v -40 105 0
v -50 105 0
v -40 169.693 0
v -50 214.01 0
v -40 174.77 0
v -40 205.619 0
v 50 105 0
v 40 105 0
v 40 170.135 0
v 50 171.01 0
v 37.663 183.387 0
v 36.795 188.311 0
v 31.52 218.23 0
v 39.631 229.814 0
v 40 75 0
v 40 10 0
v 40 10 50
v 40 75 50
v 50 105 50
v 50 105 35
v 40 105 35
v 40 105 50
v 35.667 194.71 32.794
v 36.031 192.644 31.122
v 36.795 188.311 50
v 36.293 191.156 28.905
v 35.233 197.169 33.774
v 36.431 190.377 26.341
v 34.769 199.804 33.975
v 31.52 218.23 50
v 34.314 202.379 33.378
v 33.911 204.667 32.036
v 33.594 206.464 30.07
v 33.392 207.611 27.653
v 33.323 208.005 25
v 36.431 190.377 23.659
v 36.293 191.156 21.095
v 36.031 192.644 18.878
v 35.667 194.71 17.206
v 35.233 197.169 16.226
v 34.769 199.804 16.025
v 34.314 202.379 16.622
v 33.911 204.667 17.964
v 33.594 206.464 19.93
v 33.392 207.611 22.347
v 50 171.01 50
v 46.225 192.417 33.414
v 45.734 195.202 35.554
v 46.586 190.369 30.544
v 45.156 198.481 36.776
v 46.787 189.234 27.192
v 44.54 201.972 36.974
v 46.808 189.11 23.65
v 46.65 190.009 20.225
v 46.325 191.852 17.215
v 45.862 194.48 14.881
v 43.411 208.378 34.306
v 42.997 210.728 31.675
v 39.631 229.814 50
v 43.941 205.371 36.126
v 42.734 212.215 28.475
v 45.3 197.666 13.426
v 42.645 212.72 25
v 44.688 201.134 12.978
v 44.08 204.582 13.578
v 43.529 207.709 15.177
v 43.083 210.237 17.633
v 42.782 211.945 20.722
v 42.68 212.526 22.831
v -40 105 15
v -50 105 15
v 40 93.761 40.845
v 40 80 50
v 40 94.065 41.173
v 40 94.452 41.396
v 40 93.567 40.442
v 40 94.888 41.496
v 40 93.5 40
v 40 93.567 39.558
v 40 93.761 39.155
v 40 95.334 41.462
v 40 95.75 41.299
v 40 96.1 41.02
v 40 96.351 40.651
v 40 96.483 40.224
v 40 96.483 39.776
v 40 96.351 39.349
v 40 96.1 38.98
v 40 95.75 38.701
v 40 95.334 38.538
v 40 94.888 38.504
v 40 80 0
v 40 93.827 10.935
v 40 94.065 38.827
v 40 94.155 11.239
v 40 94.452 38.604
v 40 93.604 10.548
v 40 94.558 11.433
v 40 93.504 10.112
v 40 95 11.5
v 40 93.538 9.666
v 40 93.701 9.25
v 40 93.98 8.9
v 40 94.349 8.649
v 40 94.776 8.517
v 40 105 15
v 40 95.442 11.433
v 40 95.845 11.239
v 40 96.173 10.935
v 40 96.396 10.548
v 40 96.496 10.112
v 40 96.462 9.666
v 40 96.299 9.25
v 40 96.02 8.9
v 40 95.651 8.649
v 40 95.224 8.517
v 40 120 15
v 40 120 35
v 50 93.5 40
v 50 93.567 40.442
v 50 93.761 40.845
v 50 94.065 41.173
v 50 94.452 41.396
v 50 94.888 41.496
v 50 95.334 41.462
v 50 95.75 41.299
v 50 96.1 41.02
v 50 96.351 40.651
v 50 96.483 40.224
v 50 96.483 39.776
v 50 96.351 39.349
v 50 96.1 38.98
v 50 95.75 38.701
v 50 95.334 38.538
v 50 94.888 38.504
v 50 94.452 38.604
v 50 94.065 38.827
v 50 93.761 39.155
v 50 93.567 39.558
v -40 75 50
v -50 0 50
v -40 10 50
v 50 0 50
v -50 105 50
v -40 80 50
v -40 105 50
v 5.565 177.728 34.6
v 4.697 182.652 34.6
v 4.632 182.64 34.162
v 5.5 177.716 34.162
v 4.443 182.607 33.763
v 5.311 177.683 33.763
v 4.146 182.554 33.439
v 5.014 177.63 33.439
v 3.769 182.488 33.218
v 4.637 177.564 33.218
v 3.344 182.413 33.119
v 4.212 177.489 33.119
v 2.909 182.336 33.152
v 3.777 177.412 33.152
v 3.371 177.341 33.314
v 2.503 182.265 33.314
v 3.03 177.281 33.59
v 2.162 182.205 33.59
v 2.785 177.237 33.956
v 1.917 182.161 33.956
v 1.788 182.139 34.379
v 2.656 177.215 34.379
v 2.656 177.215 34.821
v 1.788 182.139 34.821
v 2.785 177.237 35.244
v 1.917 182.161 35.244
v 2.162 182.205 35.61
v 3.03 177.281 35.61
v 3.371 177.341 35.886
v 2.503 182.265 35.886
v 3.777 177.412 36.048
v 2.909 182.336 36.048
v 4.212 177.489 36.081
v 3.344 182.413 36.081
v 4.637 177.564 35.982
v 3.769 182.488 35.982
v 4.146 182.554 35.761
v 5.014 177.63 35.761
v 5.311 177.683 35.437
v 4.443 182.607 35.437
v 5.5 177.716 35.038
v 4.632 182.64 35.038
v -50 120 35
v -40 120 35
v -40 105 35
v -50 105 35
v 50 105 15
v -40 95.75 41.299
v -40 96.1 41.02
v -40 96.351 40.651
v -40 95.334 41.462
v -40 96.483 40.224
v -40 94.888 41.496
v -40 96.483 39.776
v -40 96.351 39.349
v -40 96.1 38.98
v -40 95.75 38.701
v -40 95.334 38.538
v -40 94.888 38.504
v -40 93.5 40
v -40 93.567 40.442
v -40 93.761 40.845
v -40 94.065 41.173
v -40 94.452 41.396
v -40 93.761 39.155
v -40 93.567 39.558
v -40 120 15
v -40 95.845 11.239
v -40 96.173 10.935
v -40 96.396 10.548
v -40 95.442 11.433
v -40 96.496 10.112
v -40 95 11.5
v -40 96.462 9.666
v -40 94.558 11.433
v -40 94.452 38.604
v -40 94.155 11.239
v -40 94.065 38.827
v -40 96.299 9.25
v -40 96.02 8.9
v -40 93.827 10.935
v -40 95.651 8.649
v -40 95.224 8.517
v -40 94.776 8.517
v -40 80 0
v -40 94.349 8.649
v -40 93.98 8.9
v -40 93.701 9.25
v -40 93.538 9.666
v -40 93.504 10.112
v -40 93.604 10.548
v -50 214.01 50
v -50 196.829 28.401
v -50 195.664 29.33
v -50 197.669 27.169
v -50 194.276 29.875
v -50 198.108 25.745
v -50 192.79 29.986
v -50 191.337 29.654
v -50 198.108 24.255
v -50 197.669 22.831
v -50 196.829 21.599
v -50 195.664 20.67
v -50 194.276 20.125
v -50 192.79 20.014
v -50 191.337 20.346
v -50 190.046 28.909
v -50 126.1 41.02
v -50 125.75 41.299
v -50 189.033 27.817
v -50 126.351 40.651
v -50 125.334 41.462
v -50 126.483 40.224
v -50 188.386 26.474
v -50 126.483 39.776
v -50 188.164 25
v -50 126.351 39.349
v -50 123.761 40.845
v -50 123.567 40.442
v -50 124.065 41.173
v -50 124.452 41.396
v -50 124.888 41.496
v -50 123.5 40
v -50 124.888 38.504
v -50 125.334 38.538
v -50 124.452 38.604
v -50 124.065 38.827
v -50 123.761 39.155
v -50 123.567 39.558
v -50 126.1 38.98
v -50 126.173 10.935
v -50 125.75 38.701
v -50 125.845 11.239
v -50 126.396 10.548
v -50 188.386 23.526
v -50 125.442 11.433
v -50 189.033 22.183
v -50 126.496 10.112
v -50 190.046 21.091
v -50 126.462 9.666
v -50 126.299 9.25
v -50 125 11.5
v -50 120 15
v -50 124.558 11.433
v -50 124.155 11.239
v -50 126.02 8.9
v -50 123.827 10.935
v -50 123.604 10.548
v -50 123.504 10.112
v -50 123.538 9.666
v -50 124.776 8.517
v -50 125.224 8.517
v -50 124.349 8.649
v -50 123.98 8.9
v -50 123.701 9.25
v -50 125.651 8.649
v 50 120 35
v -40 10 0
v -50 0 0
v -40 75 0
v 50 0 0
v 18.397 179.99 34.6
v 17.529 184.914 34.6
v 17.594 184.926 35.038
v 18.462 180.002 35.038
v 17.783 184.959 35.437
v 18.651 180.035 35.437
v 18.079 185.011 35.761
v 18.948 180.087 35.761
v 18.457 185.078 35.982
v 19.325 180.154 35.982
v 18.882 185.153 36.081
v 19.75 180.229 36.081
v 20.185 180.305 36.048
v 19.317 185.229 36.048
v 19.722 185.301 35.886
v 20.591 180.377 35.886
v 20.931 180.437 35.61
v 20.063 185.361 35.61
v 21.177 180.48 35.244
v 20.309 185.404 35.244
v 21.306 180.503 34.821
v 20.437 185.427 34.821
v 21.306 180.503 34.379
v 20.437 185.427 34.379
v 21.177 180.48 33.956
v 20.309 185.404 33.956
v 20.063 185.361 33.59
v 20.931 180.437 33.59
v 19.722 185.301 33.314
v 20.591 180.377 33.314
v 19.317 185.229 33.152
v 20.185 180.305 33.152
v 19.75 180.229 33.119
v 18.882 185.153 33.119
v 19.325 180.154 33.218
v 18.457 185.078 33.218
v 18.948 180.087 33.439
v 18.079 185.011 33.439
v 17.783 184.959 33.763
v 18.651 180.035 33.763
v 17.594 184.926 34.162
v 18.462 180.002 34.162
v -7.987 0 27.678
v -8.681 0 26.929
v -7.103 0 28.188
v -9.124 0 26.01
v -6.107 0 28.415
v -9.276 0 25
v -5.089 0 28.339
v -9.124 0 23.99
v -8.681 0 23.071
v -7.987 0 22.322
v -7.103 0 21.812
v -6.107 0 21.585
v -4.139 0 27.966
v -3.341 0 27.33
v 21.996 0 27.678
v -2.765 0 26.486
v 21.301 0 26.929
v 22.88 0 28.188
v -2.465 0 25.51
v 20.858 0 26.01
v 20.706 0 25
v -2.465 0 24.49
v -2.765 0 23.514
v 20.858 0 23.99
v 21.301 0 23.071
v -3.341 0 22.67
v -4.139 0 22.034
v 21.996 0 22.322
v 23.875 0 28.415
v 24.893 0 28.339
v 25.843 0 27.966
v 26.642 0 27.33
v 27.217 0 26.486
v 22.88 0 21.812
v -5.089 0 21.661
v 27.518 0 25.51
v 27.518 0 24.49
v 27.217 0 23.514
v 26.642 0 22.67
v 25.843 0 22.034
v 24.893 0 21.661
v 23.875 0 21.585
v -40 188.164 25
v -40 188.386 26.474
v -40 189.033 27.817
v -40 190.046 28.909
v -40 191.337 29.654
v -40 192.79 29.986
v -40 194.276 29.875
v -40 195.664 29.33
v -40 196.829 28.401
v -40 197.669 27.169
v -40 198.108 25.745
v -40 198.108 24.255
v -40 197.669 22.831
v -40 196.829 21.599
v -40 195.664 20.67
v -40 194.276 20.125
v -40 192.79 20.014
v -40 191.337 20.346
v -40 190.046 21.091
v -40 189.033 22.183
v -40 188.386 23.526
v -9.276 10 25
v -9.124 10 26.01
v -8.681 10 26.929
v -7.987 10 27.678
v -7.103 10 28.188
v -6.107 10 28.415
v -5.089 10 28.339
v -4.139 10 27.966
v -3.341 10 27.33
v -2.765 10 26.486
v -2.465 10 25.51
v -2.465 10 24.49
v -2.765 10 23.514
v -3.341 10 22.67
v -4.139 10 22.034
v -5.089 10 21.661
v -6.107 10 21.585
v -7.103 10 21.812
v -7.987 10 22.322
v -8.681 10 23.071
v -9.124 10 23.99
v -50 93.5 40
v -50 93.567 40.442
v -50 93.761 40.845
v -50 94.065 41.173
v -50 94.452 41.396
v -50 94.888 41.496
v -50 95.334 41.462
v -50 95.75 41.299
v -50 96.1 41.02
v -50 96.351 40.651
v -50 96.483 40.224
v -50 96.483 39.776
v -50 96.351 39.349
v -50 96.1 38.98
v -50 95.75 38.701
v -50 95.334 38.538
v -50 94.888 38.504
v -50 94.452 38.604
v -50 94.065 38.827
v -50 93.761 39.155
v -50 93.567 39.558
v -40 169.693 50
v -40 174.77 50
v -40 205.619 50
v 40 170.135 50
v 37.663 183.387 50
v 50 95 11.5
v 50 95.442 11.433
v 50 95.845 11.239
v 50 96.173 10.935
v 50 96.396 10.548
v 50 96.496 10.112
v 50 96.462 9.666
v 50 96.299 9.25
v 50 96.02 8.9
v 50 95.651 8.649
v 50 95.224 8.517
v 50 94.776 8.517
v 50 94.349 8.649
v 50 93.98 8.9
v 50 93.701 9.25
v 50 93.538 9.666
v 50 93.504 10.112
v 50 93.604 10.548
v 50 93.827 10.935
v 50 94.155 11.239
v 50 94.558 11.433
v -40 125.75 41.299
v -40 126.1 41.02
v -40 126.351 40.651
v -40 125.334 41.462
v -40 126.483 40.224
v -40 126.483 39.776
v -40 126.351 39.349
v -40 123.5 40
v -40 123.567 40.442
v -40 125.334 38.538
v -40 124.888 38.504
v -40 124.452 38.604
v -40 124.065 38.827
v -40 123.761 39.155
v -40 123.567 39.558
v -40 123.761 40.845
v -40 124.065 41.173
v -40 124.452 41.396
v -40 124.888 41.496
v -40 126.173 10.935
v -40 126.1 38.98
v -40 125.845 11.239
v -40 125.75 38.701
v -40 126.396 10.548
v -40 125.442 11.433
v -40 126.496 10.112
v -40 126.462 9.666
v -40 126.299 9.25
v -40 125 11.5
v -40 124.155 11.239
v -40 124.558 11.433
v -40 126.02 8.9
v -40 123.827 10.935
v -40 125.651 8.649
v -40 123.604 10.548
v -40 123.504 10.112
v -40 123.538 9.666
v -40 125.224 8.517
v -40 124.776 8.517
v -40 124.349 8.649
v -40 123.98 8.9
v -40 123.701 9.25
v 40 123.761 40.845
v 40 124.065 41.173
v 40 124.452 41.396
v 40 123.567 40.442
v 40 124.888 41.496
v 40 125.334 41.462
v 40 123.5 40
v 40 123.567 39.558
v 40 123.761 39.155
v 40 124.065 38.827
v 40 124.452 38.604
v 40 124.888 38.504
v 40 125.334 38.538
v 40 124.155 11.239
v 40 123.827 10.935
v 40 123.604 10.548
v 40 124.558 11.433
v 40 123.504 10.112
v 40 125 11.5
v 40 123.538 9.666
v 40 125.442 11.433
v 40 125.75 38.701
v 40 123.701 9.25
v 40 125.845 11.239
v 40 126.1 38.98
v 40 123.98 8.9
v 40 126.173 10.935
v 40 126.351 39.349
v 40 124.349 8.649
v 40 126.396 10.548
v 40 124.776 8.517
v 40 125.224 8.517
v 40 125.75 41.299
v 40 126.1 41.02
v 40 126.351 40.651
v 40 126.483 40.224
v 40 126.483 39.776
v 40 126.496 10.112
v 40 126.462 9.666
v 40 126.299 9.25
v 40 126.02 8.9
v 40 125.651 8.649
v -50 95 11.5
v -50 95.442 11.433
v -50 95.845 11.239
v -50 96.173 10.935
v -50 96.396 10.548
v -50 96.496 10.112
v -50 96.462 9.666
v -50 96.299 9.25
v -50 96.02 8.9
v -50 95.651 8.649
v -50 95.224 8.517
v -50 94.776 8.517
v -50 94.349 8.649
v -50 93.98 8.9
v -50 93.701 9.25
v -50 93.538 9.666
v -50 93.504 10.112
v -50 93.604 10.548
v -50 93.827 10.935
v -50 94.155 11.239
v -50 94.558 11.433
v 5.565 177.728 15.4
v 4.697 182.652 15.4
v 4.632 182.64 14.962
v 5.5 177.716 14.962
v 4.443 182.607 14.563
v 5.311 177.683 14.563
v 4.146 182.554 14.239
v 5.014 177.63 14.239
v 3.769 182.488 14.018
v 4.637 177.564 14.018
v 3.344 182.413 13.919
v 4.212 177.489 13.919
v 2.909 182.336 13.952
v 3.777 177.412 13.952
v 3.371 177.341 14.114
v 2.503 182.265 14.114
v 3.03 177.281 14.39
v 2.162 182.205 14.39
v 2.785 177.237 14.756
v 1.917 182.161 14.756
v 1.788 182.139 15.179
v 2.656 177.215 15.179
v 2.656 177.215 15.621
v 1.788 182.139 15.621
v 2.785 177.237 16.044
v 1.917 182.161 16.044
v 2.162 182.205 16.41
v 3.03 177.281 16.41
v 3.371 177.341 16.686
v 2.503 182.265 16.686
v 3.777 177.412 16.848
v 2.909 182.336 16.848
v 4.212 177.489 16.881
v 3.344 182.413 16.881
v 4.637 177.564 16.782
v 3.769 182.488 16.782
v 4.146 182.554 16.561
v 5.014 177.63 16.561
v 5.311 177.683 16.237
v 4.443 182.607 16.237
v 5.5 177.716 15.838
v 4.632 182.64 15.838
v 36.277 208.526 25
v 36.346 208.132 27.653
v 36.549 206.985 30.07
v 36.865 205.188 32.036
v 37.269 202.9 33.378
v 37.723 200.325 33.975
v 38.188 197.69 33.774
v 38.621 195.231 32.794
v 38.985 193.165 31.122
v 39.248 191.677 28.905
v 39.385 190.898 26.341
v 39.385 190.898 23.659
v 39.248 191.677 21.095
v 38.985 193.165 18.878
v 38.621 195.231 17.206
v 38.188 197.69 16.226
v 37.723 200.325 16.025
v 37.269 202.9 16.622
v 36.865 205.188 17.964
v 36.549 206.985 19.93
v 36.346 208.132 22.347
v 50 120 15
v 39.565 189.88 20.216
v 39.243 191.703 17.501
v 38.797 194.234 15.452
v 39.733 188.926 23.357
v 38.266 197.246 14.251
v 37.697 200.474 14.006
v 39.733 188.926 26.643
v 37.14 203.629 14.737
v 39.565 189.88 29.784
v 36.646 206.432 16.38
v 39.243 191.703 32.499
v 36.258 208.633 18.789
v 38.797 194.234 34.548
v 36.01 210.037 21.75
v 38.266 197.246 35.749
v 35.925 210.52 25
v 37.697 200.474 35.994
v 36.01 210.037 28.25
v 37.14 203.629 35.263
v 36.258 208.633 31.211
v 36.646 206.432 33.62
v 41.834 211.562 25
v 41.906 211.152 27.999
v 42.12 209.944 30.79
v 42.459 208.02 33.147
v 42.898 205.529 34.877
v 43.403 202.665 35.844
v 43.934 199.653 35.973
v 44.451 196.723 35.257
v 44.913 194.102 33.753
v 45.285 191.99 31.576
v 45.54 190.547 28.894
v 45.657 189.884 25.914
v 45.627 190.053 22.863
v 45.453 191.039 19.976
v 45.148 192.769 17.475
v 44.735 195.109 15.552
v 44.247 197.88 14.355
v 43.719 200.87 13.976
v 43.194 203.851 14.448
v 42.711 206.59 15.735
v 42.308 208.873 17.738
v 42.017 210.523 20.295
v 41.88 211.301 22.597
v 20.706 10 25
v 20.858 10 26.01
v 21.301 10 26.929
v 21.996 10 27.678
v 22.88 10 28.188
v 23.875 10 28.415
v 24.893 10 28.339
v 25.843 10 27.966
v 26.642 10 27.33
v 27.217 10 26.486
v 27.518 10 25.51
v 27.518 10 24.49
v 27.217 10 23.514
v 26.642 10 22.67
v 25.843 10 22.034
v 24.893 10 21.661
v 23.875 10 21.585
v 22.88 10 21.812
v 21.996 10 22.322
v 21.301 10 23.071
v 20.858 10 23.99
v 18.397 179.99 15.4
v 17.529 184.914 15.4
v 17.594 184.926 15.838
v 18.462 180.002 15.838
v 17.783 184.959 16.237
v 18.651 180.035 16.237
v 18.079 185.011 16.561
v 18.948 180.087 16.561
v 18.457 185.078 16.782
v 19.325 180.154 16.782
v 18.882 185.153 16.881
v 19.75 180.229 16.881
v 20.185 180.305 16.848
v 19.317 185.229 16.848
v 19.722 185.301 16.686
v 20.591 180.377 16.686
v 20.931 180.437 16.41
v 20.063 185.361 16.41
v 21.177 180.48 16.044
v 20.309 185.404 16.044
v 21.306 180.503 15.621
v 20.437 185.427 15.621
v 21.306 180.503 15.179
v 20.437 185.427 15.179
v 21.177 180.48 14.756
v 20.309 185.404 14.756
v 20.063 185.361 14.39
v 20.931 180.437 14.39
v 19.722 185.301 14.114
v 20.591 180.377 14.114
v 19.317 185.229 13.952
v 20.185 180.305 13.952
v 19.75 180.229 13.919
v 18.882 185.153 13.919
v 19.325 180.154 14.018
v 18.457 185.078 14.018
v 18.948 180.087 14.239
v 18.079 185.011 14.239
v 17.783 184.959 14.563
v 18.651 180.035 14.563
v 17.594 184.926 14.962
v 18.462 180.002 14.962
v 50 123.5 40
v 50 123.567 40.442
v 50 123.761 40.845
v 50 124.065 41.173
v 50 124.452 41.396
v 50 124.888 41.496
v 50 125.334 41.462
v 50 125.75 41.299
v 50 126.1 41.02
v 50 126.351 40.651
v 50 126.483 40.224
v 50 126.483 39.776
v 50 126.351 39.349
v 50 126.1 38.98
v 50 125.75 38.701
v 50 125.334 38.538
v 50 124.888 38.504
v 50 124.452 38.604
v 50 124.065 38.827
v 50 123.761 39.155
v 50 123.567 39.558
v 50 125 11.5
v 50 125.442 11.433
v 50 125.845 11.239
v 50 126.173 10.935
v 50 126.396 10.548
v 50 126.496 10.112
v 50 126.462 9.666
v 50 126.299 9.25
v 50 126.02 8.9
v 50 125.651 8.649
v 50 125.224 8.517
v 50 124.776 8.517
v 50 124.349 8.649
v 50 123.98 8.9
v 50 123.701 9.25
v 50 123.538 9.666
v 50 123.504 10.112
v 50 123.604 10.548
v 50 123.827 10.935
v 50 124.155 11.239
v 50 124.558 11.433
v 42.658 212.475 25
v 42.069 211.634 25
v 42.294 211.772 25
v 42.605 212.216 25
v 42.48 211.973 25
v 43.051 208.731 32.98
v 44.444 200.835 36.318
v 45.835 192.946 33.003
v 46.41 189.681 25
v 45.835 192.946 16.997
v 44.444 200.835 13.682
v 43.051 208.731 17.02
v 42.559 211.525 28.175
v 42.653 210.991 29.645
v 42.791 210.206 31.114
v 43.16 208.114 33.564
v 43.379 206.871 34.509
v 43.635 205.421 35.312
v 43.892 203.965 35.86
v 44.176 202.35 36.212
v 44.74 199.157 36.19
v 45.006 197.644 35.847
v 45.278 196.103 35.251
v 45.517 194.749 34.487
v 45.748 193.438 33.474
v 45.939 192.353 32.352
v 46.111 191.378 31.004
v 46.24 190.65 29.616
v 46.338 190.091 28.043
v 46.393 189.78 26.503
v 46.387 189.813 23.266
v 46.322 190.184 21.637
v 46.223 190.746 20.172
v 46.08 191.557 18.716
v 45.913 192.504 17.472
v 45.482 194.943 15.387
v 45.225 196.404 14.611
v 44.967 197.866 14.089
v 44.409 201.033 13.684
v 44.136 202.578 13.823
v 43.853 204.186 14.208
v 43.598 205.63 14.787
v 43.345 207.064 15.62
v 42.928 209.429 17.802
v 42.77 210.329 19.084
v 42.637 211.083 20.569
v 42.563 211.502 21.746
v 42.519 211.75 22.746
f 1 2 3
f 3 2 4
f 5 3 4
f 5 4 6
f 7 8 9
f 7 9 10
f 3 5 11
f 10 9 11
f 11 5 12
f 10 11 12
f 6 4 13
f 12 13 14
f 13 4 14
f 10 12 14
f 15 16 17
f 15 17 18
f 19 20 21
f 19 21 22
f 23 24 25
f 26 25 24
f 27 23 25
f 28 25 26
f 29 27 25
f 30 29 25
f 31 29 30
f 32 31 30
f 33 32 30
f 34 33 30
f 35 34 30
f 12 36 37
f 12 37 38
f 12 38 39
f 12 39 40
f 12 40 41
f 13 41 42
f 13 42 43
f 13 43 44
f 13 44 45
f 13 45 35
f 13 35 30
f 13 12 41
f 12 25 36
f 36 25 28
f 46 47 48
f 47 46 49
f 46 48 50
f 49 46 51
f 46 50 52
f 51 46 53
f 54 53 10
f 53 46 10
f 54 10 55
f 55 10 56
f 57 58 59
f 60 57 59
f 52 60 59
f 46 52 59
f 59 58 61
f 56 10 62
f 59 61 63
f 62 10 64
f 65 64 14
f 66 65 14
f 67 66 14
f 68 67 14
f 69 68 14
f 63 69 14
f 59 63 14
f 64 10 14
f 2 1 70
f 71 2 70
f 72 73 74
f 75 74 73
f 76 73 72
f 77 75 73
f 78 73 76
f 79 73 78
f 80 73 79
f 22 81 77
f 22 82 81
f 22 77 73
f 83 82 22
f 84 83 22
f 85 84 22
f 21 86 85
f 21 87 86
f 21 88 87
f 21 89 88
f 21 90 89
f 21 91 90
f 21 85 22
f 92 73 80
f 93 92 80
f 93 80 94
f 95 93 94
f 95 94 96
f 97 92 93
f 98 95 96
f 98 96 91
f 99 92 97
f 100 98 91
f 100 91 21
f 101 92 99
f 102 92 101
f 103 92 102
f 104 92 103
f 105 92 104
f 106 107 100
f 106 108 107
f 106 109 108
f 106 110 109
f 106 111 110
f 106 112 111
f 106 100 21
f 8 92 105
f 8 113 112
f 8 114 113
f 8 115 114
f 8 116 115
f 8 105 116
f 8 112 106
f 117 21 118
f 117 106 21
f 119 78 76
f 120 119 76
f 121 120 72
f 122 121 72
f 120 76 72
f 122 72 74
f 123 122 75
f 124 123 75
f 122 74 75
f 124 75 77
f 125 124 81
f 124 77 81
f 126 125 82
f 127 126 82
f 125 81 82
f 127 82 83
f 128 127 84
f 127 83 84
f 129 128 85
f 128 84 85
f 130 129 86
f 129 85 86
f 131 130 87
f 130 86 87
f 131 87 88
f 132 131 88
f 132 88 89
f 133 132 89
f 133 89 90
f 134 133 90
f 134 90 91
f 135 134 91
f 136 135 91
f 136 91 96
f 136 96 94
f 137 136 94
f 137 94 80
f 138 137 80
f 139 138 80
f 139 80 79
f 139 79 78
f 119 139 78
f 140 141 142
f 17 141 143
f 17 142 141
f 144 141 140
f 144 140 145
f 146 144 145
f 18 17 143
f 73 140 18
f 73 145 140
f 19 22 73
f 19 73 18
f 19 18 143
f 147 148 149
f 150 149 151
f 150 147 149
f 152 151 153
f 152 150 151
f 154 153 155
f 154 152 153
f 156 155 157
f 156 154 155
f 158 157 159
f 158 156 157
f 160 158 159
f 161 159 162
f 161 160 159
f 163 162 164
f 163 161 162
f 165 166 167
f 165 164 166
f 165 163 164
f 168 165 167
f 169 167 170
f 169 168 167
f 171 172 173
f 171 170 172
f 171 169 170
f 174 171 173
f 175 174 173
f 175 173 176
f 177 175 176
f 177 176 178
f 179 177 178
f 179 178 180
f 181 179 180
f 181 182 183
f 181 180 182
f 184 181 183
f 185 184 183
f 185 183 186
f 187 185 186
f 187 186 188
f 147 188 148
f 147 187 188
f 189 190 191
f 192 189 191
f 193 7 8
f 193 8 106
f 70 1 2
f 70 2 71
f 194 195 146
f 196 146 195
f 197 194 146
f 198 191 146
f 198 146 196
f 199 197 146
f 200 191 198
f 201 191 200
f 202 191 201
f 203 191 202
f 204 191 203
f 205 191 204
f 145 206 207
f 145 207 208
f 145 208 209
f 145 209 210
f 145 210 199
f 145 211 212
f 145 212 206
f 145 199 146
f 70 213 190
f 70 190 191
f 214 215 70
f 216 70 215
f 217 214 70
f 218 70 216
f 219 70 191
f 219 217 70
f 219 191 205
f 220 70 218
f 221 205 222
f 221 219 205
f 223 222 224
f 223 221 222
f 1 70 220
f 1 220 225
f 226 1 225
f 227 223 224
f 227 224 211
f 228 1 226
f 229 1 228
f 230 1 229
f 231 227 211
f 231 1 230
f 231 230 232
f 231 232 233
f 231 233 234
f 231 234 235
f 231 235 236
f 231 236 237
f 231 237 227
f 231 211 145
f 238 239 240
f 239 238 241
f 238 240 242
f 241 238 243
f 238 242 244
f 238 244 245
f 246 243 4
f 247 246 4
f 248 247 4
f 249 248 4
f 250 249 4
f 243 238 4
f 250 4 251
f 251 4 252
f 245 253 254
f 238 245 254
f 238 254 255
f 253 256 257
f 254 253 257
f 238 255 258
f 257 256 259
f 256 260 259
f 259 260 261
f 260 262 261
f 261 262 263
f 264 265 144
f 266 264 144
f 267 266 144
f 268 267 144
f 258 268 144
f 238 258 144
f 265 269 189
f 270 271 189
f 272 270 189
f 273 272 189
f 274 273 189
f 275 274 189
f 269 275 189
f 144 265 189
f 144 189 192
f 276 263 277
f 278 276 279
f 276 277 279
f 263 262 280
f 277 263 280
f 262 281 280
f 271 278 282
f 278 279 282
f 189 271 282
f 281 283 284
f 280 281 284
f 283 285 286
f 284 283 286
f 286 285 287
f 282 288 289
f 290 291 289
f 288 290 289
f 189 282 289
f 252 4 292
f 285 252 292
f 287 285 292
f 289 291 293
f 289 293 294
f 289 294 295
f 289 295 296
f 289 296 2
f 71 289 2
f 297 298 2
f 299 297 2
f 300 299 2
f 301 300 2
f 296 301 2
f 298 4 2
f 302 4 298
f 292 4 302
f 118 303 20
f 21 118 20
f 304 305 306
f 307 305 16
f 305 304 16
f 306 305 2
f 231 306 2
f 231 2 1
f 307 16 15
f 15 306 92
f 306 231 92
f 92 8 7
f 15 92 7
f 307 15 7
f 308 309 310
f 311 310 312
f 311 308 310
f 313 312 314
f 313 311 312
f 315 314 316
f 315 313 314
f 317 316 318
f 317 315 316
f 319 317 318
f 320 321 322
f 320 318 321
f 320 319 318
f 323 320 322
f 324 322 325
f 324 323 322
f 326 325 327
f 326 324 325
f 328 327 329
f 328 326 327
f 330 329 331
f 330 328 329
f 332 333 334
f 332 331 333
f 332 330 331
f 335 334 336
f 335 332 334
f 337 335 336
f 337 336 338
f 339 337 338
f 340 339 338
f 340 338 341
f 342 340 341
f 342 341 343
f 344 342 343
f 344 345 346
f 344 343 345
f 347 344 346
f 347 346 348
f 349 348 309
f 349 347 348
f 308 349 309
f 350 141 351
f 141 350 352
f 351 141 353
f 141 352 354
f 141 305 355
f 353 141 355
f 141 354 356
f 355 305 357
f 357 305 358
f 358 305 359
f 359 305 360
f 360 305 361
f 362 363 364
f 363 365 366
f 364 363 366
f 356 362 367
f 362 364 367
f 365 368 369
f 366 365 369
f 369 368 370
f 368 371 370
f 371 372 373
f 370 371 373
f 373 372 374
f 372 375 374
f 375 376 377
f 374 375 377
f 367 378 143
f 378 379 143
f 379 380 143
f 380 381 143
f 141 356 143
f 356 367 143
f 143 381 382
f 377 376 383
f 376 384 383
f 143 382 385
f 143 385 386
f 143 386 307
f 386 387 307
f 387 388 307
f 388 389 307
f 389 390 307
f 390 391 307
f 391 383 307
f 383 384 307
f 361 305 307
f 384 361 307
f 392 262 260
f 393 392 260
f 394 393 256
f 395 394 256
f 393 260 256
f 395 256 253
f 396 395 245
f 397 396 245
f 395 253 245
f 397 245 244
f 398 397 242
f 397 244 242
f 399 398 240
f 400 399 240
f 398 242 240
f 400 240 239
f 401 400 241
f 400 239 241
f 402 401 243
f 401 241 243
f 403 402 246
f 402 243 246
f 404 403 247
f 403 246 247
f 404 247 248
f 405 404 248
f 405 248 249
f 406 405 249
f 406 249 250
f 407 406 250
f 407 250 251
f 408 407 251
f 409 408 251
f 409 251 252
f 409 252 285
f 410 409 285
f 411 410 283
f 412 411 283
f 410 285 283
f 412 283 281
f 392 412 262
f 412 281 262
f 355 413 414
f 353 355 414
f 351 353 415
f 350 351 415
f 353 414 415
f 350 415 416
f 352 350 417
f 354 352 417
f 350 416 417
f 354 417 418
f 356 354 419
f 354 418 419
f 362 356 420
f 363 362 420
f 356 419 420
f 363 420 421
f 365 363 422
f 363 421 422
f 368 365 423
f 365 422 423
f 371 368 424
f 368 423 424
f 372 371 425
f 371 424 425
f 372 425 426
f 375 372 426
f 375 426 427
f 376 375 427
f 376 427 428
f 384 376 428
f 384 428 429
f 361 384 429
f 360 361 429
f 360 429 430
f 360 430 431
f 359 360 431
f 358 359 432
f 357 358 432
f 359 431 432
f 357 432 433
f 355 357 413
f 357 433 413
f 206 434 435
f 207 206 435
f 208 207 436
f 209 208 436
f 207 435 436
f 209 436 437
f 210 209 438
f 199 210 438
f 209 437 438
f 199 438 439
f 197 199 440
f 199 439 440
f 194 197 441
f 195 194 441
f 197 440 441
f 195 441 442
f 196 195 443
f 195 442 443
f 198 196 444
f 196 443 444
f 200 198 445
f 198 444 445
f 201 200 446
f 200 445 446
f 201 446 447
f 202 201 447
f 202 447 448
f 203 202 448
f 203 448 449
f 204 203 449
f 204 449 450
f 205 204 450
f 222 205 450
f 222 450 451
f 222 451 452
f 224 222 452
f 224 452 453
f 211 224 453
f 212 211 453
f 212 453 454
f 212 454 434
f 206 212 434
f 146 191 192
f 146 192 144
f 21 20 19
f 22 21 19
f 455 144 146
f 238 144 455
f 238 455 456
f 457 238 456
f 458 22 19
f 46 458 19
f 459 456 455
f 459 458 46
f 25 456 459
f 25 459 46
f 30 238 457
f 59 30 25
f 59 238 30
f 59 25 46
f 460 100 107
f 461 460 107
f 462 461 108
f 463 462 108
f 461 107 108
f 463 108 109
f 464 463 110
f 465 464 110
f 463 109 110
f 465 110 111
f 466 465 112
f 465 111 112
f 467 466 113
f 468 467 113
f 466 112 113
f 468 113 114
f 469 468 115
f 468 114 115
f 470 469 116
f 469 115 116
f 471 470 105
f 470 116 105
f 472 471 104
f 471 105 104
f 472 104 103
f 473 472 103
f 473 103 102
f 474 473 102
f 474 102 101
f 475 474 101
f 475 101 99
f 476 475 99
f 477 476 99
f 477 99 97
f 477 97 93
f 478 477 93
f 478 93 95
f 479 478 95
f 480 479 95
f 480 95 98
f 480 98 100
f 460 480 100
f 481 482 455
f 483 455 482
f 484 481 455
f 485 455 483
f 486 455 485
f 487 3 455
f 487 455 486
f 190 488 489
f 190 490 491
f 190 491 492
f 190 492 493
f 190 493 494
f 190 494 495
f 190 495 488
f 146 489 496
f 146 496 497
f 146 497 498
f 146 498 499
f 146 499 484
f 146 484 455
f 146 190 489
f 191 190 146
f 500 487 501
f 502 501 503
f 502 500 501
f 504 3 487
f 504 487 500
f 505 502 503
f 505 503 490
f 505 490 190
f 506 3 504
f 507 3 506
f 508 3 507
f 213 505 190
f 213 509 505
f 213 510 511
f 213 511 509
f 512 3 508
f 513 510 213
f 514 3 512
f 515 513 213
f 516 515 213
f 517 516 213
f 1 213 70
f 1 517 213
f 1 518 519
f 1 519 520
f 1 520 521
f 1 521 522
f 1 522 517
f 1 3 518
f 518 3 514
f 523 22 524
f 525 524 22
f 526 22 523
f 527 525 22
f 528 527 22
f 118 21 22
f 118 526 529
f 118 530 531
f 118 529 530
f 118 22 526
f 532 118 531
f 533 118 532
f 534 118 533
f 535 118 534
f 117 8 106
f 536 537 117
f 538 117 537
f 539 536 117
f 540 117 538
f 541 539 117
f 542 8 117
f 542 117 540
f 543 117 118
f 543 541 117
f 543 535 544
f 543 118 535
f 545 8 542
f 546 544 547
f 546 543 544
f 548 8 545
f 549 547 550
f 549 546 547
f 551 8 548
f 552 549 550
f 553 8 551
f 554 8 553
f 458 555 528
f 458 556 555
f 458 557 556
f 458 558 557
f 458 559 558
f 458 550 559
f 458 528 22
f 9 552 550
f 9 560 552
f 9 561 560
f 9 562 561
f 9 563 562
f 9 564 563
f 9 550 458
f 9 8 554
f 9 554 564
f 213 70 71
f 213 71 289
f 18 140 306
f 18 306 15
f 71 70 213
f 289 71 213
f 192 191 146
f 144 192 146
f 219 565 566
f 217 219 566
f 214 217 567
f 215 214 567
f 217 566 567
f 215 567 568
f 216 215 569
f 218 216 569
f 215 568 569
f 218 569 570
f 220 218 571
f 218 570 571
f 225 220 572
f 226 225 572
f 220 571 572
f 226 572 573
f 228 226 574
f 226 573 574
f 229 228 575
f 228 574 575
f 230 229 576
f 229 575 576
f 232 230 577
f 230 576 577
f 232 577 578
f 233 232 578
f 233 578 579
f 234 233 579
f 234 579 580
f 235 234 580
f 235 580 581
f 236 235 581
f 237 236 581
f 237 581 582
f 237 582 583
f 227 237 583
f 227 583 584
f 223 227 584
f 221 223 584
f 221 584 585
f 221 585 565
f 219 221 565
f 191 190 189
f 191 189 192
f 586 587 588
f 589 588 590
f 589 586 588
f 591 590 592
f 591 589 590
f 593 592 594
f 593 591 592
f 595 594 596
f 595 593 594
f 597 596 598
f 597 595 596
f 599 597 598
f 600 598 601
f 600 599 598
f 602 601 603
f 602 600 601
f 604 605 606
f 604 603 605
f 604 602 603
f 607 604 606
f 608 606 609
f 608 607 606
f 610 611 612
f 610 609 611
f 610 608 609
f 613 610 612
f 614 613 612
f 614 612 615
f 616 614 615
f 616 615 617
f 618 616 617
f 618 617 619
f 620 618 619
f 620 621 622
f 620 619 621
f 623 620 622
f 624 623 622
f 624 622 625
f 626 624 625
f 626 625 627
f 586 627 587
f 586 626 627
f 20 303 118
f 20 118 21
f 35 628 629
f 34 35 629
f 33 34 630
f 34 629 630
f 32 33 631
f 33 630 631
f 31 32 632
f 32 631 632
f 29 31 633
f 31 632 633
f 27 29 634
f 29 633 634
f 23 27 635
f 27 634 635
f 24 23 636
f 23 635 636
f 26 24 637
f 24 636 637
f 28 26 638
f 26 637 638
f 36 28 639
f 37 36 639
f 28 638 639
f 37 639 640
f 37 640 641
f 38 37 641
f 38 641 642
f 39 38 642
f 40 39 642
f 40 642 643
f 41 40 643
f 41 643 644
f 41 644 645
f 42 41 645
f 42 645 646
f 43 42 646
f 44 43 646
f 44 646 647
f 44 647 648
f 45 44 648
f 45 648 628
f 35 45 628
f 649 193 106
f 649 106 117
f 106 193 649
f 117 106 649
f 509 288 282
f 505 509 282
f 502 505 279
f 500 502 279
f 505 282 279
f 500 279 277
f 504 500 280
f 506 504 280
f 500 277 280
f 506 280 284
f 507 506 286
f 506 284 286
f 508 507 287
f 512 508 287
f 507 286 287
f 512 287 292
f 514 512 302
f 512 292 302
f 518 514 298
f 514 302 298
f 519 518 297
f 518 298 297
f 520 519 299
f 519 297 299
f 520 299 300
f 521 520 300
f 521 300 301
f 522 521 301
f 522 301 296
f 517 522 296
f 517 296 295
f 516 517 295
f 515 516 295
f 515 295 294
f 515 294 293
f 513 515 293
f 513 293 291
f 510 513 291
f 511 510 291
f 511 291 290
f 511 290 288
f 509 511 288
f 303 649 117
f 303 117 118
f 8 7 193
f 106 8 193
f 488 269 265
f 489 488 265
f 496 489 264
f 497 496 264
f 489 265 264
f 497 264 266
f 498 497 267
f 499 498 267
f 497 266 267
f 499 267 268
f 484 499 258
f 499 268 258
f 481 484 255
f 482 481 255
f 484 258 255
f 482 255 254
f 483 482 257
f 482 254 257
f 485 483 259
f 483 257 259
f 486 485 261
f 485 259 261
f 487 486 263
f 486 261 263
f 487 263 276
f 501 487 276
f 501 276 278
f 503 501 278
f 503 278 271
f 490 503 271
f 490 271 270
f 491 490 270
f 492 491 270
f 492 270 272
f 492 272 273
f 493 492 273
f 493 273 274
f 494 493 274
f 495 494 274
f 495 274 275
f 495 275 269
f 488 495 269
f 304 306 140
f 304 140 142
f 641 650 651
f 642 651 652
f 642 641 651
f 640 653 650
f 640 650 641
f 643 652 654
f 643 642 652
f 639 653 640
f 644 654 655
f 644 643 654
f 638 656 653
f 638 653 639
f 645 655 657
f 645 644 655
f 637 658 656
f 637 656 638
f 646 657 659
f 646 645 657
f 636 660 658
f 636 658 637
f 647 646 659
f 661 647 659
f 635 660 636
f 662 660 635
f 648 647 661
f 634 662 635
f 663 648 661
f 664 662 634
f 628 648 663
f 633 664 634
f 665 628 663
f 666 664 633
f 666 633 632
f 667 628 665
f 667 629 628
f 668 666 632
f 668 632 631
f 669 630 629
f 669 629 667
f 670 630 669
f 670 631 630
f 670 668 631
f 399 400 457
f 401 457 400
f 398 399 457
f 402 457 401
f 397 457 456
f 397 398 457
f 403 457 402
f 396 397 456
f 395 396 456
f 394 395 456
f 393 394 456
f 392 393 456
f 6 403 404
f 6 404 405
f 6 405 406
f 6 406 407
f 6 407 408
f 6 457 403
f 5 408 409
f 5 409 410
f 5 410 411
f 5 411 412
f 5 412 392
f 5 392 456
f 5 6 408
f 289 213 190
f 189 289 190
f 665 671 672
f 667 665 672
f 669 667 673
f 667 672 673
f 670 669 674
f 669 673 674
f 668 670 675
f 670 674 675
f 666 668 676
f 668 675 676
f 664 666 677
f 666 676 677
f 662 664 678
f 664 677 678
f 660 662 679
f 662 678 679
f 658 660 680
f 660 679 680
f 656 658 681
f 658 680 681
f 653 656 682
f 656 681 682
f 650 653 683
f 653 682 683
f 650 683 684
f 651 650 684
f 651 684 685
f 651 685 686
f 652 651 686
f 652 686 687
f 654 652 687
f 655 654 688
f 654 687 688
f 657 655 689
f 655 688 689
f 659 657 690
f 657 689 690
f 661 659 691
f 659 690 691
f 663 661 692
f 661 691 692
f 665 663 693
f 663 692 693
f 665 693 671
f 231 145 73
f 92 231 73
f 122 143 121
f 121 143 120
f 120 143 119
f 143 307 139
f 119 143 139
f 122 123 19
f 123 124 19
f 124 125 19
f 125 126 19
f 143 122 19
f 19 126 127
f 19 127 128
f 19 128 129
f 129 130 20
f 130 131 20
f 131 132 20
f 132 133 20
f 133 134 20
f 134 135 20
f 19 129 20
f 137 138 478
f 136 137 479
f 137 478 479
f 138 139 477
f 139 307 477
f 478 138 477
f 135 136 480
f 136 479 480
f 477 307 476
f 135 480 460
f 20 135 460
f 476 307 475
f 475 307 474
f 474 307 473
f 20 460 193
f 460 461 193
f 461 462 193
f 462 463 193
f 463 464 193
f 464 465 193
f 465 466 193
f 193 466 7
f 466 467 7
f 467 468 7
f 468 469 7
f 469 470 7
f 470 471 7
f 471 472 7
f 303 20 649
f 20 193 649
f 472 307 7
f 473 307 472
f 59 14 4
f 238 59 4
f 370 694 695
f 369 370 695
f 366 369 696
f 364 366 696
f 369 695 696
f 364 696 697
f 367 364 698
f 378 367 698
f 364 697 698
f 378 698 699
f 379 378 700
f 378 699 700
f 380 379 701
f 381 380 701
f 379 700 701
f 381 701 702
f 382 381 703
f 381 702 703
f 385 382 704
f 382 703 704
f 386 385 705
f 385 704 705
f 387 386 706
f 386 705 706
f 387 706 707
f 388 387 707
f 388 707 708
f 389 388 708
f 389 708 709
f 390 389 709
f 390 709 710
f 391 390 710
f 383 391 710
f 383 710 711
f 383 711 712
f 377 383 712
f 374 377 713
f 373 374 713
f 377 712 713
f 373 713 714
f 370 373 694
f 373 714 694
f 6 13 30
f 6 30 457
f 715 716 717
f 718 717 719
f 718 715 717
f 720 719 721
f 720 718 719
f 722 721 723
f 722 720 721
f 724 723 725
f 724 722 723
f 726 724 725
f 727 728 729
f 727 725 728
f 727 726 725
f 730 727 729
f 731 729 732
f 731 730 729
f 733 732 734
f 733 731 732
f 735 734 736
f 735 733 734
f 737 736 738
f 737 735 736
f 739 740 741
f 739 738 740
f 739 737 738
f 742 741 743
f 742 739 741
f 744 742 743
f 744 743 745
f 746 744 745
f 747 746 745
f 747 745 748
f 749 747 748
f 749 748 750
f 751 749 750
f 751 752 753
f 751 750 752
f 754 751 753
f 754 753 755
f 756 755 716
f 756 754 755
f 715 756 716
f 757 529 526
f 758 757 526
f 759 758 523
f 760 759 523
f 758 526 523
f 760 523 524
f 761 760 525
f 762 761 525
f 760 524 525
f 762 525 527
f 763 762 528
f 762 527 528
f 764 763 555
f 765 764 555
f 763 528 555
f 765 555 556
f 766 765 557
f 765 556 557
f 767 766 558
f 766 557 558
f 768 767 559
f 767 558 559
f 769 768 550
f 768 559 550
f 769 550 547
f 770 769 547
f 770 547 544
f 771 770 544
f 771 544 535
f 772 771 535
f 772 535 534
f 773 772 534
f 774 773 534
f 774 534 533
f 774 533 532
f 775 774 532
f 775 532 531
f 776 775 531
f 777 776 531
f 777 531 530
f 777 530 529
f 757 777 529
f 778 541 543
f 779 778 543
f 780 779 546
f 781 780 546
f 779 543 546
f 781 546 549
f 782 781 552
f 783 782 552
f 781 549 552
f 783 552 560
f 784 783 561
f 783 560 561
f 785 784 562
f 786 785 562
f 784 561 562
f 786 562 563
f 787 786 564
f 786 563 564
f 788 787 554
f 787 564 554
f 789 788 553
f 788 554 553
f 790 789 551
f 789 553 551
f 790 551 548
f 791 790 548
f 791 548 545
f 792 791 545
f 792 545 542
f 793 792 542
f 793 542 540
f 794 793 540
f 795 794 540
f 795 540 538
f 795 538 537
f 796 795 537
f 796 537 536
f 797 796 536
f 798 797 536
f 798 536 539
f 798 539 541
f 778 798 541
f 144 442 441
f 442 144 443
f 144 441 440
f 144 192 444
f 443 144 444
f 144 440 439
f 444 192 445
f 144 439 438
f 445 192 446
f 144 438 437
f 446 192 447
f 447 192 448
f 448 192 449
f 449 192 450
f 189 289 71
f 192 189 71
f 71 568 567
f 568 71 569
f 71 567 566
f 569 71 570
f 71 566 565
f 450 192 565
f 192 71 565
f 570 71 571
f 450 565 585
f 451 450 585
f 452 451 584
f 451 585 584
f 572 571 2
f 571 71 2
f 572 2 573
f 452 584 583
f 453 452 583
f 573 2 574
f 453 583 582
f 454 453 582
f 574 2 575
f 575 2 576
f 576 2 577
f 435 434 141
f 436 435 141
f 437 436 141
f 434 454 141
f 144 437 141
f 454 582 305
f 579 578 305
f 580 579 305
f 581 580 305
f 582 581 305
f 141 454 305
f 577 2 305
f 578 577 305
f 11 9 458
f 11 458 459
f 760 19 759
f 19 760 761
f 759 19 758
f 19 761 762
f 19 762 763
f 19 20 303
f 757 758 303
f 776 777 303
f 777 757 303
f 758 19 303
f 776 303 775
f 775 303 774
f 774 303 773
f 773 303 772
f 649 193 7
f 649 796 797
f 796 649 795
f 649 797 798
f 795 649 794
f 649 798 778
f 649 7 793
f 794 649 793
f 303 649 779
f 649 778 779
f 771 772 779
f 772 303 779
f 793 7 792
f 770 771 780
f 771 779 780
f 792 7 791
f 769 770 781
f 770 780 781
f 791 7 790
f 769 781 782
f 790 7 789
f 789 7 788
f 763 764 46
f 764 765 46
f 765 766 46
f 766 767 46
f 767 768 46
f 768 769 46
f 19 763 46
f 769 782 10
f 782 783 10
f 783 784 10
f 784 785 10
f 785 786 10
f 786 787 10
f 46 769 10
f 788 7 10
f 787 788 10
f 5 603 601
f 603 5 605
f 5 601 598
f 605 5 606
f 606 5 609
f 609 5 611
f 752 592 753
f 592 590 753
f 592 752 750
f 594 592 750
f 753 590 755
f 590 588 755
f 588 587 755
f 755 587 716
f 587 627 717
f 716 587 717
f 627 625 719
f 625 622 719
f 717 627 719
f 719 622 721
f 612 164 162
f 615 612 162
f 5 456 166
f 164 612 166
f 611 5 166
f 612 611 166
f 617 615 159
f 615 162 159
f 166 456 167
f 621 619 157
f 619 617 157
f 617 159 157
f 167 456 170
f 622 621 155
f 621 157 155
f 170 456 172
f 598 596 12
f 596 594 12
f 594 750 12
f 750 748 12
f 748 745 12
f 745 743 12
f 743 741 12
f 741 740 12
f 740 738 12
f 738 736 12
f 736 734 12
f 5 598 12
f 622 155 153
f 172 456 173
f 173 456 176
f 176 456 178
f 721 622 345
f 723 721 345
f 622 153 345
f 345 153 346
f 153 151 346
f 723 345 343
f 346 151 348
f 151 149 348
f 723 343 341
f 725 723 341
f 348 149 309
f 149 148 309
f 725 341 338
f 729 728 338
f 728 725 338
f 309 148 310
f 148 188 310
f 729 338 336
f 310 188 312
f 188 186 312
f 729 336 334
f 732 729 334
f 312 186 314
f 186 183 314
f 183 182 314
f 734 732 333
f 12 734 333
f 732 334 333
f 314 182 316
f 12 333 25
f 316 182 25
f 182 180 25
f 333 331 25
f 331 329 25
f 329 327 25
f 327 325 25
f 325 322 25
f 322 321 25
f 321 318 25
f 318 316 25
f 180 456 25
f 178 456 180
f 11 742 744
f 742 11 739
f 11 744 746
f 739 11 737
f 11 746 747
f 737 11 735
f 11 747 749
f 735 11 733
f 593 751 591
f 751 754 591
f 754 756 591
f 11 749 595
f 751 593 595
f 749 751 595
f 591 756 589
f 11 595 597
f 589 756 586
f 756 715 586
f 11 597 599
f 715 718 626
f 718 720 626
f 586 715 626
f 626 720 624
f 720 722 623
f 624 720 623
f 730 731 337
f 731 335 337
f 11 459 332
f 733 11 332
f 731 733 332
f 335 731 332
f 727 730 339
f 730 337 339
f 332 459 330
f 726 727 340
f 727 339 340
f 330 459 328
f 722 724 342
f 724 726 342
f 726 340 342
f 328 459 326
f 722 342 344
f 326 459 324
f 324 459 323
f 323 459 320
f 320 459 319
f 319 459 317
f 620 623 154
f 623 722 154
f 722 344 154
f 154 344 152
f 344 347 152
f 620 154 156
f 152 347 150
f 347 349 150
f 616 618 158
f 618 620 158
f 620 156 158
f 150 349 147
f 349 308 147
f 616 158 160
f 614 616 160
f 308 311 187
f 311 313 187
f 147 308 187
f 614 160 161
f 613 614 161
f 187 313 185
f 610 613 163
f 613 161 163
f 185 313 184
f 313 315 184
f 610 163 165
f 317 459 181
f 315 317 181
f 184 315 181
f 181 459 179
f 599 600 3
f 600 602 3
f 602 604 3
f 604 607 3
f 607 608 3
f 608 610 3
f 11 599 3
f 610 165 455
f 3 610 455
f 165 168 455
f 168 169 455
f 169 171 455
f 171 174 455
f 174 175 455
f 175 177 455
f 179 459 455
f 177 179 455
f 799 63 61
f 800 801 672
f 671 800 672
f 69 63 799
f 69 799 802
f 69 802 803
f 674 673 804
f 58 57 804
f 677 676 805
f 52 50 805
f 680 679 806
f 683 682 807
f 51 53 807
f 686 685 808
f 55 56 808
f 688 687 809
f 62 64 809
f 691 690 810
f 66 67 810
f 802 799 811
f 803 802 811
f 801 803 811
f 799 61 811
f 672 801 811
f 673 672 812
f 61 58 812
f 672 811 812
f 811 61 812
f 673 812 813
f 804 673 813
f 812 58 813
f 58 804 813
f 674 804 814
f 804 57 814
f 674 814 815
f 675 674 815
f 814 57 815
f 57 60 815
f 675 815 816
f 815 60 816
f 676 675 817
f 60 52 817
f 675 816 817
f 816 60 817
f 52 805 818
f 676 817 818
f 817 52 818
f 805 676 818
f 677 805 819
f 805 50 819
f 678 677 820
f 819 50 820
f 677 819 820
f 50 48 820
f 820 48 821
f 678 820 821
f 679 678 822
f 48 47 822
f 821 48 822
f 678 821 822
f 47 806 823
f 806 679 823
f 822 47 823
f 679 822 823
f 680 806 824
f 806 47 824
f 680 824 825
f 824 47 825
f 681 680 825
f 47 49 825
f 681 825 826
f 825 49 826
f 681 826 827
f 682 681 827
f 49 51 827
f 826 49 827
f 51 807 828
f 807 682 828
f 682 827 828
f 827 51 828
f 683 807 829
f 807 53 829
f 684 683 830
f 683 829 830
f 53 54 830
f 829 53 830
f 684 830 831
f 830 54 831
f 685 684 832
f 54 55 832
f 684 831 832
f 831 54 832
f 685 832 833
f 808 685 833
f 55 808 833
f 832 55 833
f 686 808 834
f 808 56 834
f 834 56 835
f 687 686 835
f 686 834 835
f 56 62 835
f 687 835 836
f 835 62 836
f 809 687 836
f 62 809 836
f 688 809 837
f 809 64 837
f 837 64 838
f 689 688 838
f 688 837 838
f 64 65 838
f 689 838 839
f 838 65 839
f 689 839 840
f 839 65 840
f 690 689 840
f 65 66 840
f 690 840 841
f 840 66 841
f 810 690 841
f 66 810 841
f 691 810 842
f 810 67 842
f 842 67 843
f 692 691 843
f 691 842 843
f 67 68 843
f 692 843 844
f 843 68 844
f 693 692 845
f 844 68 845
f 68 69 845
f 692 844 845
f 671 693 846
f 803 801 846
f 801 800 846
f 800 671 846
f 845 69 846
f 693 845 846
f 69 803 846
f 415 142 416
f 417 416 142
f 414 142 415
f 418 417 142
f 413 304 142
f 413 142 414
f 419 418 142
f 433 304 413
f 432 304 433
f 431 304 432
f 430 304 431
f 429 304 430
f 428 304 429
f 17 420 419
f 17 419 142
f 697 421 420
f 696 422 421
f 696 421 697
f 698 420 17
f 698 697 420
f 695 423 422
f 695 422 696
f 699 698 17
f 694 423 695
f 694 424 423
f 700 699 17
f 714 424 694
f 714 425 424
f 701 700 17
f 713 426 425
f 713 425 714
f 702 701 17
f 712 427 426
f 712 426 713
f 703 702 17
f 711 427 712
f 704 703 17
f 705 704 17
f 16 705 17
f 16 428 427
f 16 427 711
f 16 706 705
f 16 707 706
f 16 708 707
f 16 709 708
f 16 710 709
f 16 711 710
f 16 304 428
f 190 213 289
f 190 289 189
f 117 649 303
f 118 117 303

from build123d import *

# Parameters (mm, degrees)
BOSS_EXTRUDE1_DEPTH    = 50
SKETCH4_R              = 11.025
CUT_EXTRUDE1_DEPTH     = 7
SKETCH5_R              = 9
CUT_EXTRUDE2_DEPTH     = 7
BOSS_EXTRUDE2_DEPTH    = 50
SKETCH8_R              = 5
CUT_EXTRUDE3_DEPTH     = 10
CUT_EXTRUDE4_REACH     = 271.61
SKETCH9_R              = 1.485
SKETCH10_R             = 3.425
CUT_EXTRUDE5_DEPTH     = 10
SKETCH11_W             = 80
SKETCH11_H             = 5
BOSS_EXTRUDE3_DEPTH    = 50
FILLET1_R              = 1
SKETCH14_R             = 1.5
CUT_EXTRUDE6_DEPTH     = 256.567325306
SPLIT1_SURFACE_1_BACK  = 256.567
SPLIT1_SURFACE_1_DEPTH = 513.134
SPLIT1_SURFACE_2_BACK  = 256.567
SPLIT1_SURFACE_2_DEPTH = 513.134


with BuildPart() as part:
    # Sketch2 → Boss-Extrude1 (new body)
    with BuildSketch(Plane.XY):
        Polygon((-50, 214.01), (-50, 0), (50, 0), (50, 171.01), (39.631197958, 229.814398513), align=None)
        Polygon((-40, 205.619003688), (-40, 10), (40, 10), (40, 170.135113365), (31.519602204, 218.229839206), align=None, mode=Mode.SUBTRACT)
    extrude(amount=BOSS_EXTRUDE1_DEPTH)

    # Sketch4 → Cut-Extrude1 (cut)
    with BuildSketch(Plane(origin=(77.736747875, 13.707086043, 0), x_dir=(0, 0, -1), z_dir=(0.9848077530122079, 0.17364817766693136, 0))):
        with Locations(Location((-25, 190.058116105, 0), (0, 0, 90))):
            Circle(SKETCH4_R)
    extrude(amount=-CUT_EXTRUDE1_DEPTH, mode=Mode.SUBTRACT)

    # Sketch5 → Cut-Extrude2 (cut)
    with BuildSketch(Plane(origin=(70.843093604, 12.491548799, 0), x_dir=(0, 0, -1), z_dir=(0.9848077530122079, 0.17364817766693136, 0))):
        with Locations(Location((-25, 190.058116105, 0), (0, 0, 90))):
            Circle(SKETCH5_R)
    extrude(amount=-CUT_EXTRUDE2_DEPTH, mode=Mode.SUBTRACT)

    # Sketch7 → Boss-Extrude2 (add)
    with BuildSketch(Plane.XY.offset(50)):
        Polygon((36.795033842, 188.31137967), (37.66327473, 183.387340905), (-40, 169.69321016), (-40, 174.770343219), align=None)
    extrude(amount=-BOSS_EXTRUDE2_DEPTH)

    # Sketch8 → Cut-Extrude3 (cut)
    with BuildSketch(Plane.ZY.offset(50)):
        with Locations(Location((25, 193.163858422, 0), (0, 0, 270))):
            Circle(SKETCH8_R)
    extrude(amount=-CUT_EXTRUDE3_DEPTH, mode=Mode.SUBTRACT)

    # Sketch9 → Cut-Extrude4 (cut, up to next)
    with BuildSketch(Plane(origin=(125.115031087, 198.807445061, 0), x_dir=(-0.9848077530122079, -0.17364817766693152, 0), z_dir=(-0.17364817766693152, 0.9848077530122079, 0)), mode=Mode.PRIVATE) as cut_extrude4_sk1:
        with Locations((106.879323392, 15.4)):
            Circle(SKETCH9_R)
    cut_extrude4_tool1 = extrude(cut_extrude4_sk1.sketch, amount=CUT_EXTRUDE4_REACH, mode=Mode.PRIVATE) & part.part
    # Sketch9 → Cut-Extrude4 (cut, up to next)
    with BuildSketch(Plane(origin=(125.115031087, 198.807445061, 0), x_dir=(-0.9848077530122079, -0.17364817766693152, 0), z_dir=(-0.17364817766693152, 0.9848077530122079, 0)), mode=Mode.PRIVATE) as cut_extrude4_sk2:
        with Locations((106.879323392, 34.6)):
            Circle(SKETCH9_R)
    cut_extrude4_tool2 = extrude(cut_extrude4_sk2.sketch, amount=CUT_EXTRUDE4_REACH, mode=Mode.PRIVATE) & part.part
    # Sketch9 → Cut-Extrude4 (cut, up to next)
    with BuildSketch(Plane(origin=(125.115031087, 198.807445061, 0), x_dir=(-0.9848077530122079, -0.17364817766693152, 0), z_dir=(-0.17364817766693152, 0.9848077530122079, 0)), mode=Mode.PRIVATE) as cut_extrude4_sk3:
        with Locations(Location((122.879323392, 34.6, 0), (0, 0, 180))):
            Circle(SKETCH9_R)
    cut_extrude4_tool3 = extrude(cut_extrude4_sk3.sketch, amount=CUT_EXTRUDE4_REACH, mode=Mode.PRIVATE) & part.part
    # Sketch9 → Cut-Extrude4 (cut, up to next)
    with BuildSketch(Plane(origin=(125.115031087, 198.807445061, 0), x_dir=(-0.9848077530122079, -0.17364817766693152, 0), z_dir=(-0.17364817766693152, 0.9848077530122079, 0)), mode=Mode.PRIVATE) as cut_extrude4_sk4:
        with Locations(Location((122.879323392, 15.4, 0), (0, 0, 180))):
            Circle(SKETCH9_R)
    cut_extrude4_tool4 = extrude(cut_extrude4_sk4.sketch, amount=CUT_EXTRUDE4_REACH, mode=Mode.PRIVATE) & part.part
    add(cut_extrude4_tool1.solids().sort_by_distance((19.859445, 180.248045, 15.4))[0], mode=Mode.SUBTRACT)
    add(cut_extrude4_tool2.solids().sort_by_distance((19.859445, 180.248045, 34.6))[0], mode=Mode.SUBTRACT)
    add(cut_extrude4_tool3.solids().sort_by_distance((4.102521, 177.469674, 34.6))[0], mode=Mode.SUBTRACT)
    add(cut_extrude4_tool4.solids().sort_by_distance((4.102521, 177.469674, 15.4))[0], mode=Mode.SUBTRACT)

    # Sketch10 → Cut-Extrude5 (cut)
    with BuildSketch(Plane(origin=(0, 10, 0), x_dir=(1, 0, 0), z_dir=(0, 1, 0))):
        with Locations(Location((-5.851287133, -25, 0), (0, 0, 180))):
            Circle(SKETCH10_R)
        with Locations(Location((24.130974018, -25, 0), (0, 0, 180))):
            Circle(SKETCH10_R)
    extrude(amount=-CUT_EXTRUDE5_DEPTH, mode=Mode.SUBTRACT)

    # Sketch11 → Boss-Extrude3 (add)
    with BuildSketch(Plane.XY.offset(50)):
        with Locations((0, 77.5)):
            Rectangle(SKETCH11_W, SKETCH11_H)
    extrude(amount=-BOSS_EXTRUDE3_DEPTH)

    # Fillet1
    fillet1_edges = [part.edges().sort_by_distance(p)[0] for p in [
        (46.647973521, 190.020286829, 25),
    ]]
    fillet(fillet1_edges, radius=FILLET1_R)

    # Sketch14 → Cut-Extrude6 (cut, through all)
    with BuildSketch(Plane.ZY.offset(50)):
        with Locations(Location((40, 125, 0), (0, 0, 270))):
            Circle(SKETCH14_R)
        with Locations(Location((40, 95, 0), (0, 0, 270))):
            Circle(SKETCH14_R)
        with Locations((10, 95)):
            Circle(SKETCH14_R)
        with Locations((10, 125)):
            Circle(SKETCH14_R)
    extrude(amount=-CUT_EXTRUDE6_DEPTH, mode=Mode.SUBTRACT)


with BuildPart() as body_2:
    # Split1: the piece behind the surface
    add(part.part)
    # Split1 surface: a surface, the sketch's curves swept straight by 513.134 mm
    with BuildLine(Plane.ZY.offset(50).offset(-SPLIT1_SURFACE_1_BACK), mode=Mode.PRIVATE) as split1_surface_1_path:
        Line((0, 105), (15, 105))
        Line((15, 105), (15, 120))
        Line((15, 120), (35, 120))
        Line((35, 120), (35, 105))
        Line((35, 105), (50, 105))
    split1_surface_1 = Shell.extrude(split1_surface_1_path.wire(), (-1 * SPLIT1_SURFACE_1_DEPTH, 0 * SPLIT1_SURFACE_1_DEPTH, 0 * SPLIT1_SURFACE_1_DEPTH))
    split(bisect_by=split1_surface_1, keep=Keep.BOTTOM)


with BuildPart() as part_1:
    add(part.part)

    # Split1: split by a surface, the side it looks to stays
    # Split1 surface: a surface, the sketch's curves swept straight by 513.134 mm
    with BuildLine(Plane.ZY.offset(50).offset(-SPLIT1_SURFACE_2_BACK), mode=Mode.PRIVATE) as split1_surface_2_path:
        Line((0, 105), (15, 105))
        Line((15, 105), (15, 120))
        Line((15, 120), (35, 120))
        Line((35, 120), (35, 105))
        Line((35, 105), (50, 105))
    split1_surface_2 = Shell.extrude(split1_surface_2_path.wire(), (-1 * SPLIT1_SURFACE_2_DEPTH, 0 * SPLIT1_SURFACE_2_DEPTH, 0 * SPLIT1_SURFACE_2_DEPTH))
    split(bisect_by=split1_surface_2, keep=Keep.TOP)


solid = Compound([body_2.part, part_1.part])
